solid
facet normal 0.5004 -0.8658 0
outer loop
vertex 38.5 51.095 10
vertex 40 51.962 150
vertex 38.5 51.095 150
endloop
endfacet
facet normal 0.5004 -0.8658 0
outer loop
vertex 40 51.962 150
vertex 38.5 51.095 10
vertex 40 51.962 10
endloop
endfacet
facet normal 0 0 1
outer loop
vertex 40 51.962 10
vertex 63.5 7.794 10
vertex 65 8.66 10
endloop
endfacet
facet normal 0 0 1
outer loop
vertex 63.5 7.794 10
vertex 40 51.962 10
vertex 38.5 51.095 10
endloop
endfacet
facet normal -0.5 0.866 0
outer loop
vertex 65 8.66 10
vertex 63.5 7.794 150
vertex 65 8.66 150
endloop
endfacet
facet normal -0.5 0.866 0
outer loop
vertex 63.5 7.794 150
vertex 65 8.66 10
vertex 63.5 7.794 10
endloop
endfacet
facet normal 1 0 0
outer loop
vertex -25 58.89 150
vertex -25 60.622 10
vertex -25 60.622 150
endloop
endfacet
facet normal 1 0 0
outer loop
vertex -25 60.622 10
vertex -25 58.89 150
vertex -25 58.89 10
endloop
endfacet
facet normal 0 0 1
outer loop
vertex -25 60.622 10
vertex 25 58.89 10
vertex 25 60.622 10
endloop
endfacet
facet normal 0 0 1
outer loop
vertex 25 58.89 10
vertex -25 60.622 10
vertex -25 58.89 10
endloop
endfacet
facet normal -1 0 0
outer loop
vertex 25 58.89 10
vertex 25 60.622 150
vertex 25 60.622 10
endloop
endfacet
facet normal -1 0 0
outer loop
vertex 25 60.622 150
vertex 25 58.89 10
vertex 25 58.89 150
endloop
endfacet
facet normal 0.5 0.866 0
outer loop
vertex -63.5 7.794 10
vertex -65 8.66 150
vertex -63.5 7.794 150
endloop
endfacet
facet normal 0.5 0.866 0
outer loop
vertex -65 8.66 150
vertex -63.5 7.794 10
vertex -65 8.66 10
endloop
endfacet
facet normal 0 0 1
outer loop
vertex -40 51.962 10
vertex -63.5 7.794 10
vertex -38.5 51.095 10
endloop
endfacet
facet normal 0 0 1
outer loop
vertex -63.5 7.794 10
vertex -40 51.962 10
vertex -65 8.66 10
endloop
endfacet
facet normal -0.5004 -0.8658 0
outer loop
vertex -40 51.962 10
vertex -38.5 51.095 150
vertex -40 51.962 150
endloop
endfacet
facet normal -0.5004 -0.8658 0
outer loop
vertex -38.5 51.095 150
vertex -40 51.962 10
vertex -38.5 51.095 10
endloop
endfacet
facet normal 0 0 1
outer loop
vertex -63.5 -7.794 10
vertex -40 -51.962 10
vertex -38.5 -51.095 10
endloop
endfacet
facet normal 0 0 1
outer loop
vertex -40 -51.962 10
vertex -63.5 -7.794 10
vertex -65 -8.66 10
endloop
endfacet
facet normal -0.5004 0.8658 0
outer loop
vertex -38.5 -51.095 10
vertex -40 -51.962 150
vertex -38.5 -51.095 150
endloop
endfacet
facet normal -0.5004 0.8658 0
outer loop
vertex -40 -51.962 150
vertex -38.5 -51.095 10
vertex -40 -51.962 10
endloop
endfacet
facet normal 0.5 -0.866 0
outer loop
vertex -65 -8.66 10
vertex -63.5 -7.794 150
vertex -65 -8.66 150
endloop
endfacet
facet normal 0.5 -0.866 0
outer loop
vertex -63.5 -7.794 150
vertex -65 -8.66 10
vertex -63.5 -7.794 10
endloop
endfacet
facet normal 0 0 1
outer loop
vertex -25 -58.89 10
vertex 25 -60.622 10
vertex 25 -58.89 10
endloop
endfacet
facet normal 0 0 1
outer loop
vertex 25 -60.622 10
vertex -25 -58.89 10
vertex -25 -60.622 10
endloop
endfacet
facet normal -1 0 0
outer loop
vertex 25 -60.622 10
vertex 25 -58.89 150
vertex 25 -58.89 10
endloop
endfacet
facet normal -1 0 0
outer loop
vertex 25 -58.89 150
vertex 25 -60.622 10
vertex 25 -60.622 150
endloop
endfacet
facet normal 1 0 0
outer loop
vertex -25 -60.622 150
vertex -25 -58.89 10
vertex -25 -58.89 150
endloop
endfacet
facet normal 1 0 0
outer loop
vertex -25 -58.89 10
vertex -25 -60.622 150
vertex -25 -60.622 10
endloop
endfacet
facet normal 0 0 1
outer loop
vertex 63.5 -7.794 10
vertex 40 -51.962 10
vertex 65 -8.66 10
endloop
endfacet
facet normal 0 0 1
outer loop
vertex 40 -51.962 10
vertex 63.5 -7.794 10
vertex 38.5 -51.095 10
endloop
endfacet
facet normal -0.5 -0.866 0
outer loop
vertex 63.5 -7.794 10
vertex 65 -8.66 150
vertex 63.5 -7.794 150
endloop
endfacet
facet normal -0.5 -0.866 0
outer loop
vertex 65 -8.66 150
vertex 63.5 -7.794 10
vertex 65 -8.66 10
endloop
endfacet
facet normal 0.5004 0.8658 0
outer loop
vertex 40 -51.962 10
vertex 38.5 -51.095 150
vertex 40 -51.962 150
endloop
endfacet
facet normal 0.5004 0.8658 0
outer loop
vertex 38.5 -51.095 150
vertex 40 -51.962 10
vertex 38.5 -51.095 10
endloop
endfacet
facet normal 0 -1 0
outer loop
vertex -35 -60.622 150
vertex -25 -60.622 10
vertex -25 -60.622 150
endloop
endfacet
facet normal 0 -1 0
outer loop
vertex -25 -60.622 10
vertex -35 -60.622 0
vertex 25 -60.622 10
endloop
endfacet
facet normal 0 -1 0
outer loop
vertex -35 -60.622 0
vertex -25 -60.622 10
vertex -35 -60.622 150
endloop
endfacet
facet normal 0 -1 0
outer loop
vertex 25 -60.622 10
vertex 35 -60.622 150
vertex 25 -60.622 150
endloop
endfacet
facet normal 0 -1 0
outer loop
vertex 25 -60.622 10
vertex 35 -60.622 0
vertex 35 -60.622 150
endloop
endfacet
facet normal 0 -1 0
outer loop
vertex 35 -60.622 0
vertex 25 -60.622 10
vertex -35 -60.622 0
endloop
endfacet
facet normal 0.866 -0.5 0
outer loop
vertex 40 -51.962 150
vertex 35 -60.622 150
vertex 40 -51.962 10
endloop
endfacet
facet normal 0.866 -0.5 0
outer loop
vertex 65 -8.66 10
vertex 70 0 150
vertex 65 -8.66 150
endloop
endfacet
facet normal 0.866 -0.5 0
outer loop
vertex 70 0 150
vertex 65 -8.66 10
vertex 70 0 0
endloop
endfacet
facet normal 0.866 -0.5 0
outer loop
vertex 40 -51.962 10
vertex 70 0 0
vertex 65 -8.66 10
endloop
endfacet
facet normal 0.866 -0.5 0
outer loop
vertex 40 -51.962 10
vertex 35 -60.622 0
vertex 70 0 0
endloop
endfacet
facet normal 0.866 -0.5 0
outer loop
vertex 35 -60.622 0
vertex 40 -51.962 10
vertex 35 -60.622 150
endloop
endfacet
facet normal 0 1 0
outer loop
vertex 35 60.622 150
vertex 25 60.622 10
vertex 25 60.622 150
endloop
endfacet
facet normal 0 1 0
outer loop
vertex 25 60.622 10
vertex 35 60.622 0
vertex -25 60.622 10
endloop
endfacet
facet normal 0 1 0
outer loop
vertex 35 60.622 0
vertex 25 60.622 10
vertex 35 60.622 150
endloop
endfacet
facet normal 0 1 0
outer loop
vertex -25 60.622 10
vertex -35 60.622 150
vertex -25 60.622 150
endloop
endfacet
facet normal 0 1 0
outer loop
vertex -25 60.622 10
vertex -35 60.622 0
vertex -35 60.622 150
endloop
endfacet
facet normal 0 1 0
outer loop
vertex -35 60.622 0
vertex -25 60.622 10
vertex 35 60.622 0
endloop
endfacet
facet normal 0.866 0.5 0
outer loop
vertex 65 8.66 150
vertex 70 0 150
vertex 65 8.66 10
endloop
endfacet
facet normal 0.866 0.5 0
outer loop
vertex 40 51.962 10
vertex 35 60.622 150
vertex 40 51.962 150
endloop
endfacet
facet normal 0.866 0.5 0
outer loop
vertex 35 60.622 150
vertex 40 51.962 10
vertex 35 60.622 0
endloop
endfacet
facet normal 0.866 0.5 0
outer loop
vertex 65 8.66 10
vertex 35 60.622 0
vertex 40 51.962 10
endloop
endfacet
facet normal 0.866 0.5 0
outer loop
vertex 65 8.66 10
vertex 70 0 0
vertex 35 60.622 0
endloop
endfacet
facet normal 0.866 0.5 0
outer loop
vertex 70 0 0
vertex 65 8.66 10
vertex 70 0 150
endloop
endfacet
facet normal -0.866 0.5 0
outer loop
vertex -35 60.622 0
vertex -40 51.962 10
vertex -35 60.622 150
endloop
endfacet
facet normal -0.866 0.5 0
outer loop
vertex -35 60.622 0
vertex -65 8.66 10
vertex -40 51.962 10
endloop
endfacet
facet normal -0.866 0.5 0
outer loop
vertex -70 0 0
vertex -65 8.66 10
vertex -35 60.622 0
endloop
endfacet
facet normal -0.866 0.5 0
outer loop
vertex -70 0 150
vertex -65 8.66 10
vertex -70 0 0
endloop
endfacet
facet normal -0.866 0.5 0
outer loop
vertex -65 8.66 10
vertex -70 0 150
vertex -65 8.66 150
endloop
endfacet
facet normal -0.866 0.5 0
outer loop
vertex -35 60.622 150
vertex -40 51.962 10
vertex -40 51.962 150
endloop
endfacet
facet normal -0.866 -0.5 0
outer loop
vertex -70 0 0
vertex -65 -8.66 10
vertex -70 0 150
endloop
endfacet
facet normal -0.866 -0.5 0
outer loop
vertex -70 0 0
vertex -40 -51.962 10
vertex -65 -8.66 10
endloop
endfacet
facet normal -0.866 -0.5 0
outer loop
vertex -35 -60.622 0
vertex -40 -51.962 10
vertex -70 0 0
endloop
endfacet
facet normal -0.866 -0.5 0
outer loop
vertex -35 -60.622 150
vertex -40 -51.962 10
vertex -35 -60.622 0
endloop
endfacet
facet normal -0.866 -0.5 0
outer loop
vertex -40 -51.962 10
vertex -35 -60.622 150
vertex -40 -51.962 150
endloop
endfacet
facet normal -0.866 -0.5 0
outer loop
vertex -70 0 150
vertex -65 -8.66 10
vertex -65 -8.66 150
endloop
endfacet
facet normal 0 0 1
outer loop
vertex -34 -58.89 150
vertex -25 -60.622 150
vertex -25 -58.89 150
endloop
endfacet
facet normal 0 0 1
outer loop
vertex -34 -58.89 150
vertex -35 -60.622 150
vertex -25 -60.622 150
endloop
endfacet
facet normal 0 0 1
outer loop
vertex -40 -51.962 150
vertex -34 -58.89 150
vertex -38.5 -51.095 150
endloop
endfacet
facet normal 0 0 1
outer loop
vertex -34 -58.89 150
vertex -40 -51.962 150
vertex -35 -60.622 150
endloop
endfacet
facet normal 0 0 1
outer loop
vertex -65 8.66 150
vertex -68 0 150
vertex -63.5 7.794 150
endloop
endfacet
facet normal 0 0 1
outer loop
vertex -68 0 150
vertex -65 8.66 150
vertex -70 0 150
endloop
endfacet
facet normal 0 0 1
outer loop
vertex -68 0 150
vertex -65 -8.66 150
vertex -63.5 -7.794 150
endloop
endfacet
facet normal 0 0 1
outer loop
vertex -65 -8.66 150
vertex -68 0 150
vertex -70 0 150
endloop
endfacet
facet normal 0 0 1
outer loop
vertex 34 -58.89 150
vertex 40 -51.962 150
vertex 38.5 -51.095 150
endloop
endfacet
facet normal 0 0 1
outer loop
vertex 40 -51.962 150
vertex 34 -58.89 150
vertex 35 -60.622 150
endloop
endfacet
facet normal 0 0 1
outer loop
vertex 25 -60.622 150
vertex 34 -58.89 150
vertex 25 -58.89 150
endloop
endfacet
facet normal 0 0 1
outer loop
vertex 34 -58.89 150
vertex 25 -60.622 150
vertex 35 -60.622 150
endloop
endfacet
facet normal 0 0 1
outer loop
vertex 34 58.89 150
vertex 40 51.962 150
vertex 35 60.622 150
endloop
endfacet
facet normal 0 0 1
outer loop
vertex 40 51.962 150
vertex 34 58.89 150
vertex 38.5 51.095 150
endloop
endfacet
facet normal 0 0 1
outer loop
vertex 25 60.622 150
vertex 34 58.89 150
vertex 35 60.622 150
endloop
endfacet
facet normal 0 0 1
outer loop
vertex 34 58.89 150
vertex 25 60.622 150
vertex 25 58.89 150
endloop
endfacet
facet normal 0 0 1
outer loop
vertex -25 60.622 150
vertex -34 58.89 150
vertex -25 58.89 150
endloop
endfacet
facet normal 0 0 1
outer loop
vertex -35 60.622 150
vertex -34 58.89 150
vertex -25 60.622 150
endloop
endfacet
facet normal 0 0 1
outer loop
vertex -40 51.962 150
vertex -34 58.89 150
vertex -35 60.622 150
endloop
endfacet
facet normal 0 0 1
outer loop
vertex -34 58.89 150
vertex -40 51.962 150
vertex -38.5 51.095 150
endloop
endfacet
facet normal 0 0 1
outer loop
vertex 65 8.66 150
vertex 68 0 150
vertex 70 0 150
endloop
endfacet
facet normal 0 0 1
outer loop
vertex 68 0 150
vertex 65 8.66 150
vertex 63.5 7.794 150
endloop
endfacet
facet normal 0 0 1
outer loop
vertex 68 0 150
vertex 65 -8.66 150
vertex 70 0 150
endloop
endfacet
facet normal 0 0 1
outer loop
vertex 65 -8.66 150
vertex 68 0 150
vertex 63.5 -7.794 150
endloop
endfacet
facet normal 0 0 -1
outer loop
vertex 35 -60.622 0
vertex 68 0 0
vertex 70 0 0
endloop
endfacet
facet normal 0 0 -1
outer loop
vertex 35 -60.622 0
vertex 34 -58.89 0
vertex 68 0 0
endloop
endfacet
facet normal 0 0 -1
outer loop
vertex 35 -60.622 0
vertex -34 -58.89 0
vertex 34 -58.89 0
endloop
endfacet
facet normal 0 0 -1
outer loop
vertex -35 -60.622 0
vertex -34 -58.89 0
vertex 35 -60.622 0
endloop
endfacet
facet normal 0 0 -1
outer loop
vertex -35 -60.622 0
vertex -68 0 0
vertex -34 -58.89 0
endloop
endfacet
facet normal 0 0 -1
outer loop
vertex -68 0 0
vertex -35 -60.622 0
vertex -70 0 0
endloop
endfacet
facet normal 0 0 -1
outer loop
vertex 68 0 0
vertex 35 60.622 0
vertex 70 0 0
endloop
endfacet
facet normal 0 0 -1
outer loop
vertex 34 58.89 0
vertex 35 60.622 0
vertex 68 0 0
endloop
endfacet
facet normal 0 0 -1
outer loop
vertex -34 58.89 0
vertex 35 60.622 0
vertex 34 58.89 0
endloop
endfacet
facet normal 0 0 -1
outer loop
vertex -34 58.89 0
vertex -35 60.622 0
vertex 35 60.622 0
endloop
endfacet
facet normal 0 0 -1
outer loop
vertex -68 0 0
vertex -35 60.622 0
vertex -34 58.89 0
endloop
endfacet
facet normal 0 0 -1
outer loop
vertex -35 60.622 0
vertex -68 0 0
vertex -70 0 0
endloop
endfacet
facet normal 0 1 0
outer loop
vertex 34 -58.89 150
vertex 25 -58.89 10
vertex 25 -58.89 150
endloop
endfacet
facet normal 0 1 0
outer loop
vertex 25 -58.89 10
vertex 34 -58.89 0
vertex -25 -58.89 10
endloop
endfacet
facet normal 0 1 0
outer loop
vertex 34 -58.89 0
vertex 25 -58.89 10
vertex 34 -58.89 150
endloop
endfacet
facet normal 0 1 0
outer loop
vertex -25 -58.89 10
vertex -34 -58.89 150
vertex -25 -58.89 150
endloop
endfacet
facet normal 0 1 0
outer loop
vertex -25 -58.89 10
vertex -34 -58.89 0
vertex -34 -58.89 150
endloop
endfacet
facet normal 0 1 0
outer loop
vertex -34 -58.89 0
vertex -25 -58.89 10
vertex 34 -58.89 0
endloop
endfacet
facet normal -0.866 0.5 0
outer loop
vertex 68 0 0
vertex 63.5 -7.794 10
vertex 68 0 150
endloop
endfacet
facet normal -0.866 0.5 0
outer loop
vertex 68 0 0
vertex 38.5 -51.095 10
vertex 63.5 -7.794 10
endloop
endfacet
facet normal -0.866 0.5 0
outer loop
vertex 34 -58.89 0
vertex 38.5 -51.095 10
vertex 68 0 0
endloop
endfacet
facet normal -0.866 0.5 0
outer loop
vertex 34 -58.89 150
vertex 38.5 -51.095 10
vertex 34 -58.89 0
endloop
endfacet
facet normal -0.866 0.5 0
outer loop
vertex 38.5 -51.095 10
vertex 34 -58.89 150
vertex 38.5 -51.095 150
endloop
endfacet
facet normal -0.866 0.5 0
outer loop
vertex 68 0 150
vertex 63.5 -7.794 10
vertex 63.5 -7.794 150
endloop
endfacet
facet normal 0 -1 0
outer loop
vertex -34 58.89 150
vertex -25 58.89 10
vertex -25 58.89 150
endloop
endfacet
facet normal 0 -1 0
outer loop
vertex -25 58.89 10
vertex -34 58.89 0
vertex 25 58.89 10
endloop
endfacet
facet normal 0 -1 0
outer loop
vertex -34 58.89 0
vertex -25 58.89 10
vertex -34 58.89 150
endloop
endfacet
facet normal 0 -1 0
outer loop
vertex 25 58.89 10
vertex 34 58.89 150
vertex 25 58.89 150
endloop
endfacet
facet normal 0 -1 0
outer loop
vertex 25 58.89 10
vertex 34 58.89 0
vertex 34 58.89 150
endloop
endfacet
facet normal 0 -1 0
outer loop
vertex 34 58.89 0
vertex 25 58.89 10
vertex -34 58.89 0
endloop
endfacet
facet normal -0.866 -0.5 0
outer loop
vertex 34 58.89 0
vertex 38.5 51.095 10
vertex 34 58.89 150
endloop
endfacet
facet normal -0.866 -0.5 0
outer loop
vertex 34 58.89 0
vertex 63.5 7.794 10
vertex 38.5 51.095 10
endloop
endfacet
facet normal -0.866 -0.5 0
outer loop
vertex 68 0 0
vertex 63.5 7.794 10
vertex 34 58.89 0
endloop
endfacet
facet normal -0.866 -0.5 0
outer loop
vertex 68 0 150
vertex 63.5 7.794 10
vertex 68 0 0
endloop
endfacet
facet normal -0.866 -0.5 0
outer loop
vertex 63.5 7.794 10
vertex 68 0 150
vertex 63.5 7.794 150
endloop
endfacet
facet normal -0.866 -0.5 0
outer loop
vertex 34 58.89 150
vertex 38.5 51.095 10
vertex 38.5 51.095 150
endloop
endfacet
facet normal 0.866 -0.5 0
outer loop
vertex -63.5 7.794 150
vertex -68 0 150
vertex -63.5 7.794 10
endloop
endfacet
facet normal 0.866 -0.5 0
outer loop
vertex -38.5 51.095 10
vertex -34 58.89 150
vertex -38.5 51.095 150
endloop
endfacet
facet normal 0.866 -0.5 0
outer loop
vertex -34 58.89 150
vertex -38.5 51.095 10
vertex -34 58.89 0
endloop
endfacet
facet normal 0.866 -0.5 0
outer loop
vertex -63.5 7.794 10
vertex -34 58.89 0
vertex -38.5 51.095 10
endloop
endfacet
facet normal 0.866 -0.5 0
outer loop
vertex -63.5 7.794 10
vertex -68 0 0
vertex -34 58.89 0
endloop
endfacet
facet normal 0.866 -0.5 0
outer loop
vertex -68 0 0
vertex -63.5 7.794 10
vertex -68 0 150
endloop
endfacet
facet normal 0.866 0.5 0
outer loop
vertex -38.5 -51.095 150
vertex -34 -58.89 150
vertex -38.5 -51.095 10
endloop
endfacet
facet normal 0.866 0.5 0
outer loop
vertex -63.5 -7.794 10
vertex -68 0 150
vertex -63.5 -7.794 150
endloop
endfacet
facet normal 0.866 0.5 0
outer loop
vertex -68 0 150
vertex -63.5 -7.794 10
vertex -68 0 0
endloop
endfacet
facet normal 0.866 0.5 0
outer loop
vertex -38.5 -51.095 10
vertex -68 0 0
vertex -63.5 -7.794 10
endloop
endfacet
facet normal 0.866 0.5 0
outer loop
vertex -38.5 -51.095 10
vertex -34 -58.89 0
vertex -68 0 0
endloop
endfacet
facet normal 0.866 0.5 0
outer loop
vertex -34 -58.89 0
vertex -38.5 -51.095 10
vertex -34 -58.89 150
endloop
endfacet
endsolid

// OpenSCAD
s = 2;
num_edges = 6;
r = 70;
h = 150;
b_h = 30;
b_i_h = b_h/2;
holes_r = 3;
holes_num = 10;
holes_pos = r/2;
increment = 360 / num_edges;
mu = 0.4;

//l_edge = (2 * PI * r)/num_edges;
l_edge = 2*r * sin(increment/2);
holder_w = 10;

difference() {
    cylinder(h,r,r,$fn=num_edges);
    cylinder(h,r-s,r-s,$fn=num_edges);

    for (angle = [0 : increment : 360]) {
        translate([0,0,holder_w])rotate([0,0,angle]) translate([r,0,0]) rotate([0,0,increment/2]) {
            translate([-s,holder_w,0])cube([s*2,l_edge-holder_w*2,h]);
        }
    }

}




//for (angle = [0 : increment : 360]) {
//    rotate([0,0,angle]) translate([r,0,0]) {
//        rotate([0,0,increment/2]) translate([0,-edge_fill,0]) cube([2,10,10]);
//        rotate([0,0,-increment/2]) translate([0,-10+edge_fill,0]) cube([2,10,10]);        
//    }
//}
